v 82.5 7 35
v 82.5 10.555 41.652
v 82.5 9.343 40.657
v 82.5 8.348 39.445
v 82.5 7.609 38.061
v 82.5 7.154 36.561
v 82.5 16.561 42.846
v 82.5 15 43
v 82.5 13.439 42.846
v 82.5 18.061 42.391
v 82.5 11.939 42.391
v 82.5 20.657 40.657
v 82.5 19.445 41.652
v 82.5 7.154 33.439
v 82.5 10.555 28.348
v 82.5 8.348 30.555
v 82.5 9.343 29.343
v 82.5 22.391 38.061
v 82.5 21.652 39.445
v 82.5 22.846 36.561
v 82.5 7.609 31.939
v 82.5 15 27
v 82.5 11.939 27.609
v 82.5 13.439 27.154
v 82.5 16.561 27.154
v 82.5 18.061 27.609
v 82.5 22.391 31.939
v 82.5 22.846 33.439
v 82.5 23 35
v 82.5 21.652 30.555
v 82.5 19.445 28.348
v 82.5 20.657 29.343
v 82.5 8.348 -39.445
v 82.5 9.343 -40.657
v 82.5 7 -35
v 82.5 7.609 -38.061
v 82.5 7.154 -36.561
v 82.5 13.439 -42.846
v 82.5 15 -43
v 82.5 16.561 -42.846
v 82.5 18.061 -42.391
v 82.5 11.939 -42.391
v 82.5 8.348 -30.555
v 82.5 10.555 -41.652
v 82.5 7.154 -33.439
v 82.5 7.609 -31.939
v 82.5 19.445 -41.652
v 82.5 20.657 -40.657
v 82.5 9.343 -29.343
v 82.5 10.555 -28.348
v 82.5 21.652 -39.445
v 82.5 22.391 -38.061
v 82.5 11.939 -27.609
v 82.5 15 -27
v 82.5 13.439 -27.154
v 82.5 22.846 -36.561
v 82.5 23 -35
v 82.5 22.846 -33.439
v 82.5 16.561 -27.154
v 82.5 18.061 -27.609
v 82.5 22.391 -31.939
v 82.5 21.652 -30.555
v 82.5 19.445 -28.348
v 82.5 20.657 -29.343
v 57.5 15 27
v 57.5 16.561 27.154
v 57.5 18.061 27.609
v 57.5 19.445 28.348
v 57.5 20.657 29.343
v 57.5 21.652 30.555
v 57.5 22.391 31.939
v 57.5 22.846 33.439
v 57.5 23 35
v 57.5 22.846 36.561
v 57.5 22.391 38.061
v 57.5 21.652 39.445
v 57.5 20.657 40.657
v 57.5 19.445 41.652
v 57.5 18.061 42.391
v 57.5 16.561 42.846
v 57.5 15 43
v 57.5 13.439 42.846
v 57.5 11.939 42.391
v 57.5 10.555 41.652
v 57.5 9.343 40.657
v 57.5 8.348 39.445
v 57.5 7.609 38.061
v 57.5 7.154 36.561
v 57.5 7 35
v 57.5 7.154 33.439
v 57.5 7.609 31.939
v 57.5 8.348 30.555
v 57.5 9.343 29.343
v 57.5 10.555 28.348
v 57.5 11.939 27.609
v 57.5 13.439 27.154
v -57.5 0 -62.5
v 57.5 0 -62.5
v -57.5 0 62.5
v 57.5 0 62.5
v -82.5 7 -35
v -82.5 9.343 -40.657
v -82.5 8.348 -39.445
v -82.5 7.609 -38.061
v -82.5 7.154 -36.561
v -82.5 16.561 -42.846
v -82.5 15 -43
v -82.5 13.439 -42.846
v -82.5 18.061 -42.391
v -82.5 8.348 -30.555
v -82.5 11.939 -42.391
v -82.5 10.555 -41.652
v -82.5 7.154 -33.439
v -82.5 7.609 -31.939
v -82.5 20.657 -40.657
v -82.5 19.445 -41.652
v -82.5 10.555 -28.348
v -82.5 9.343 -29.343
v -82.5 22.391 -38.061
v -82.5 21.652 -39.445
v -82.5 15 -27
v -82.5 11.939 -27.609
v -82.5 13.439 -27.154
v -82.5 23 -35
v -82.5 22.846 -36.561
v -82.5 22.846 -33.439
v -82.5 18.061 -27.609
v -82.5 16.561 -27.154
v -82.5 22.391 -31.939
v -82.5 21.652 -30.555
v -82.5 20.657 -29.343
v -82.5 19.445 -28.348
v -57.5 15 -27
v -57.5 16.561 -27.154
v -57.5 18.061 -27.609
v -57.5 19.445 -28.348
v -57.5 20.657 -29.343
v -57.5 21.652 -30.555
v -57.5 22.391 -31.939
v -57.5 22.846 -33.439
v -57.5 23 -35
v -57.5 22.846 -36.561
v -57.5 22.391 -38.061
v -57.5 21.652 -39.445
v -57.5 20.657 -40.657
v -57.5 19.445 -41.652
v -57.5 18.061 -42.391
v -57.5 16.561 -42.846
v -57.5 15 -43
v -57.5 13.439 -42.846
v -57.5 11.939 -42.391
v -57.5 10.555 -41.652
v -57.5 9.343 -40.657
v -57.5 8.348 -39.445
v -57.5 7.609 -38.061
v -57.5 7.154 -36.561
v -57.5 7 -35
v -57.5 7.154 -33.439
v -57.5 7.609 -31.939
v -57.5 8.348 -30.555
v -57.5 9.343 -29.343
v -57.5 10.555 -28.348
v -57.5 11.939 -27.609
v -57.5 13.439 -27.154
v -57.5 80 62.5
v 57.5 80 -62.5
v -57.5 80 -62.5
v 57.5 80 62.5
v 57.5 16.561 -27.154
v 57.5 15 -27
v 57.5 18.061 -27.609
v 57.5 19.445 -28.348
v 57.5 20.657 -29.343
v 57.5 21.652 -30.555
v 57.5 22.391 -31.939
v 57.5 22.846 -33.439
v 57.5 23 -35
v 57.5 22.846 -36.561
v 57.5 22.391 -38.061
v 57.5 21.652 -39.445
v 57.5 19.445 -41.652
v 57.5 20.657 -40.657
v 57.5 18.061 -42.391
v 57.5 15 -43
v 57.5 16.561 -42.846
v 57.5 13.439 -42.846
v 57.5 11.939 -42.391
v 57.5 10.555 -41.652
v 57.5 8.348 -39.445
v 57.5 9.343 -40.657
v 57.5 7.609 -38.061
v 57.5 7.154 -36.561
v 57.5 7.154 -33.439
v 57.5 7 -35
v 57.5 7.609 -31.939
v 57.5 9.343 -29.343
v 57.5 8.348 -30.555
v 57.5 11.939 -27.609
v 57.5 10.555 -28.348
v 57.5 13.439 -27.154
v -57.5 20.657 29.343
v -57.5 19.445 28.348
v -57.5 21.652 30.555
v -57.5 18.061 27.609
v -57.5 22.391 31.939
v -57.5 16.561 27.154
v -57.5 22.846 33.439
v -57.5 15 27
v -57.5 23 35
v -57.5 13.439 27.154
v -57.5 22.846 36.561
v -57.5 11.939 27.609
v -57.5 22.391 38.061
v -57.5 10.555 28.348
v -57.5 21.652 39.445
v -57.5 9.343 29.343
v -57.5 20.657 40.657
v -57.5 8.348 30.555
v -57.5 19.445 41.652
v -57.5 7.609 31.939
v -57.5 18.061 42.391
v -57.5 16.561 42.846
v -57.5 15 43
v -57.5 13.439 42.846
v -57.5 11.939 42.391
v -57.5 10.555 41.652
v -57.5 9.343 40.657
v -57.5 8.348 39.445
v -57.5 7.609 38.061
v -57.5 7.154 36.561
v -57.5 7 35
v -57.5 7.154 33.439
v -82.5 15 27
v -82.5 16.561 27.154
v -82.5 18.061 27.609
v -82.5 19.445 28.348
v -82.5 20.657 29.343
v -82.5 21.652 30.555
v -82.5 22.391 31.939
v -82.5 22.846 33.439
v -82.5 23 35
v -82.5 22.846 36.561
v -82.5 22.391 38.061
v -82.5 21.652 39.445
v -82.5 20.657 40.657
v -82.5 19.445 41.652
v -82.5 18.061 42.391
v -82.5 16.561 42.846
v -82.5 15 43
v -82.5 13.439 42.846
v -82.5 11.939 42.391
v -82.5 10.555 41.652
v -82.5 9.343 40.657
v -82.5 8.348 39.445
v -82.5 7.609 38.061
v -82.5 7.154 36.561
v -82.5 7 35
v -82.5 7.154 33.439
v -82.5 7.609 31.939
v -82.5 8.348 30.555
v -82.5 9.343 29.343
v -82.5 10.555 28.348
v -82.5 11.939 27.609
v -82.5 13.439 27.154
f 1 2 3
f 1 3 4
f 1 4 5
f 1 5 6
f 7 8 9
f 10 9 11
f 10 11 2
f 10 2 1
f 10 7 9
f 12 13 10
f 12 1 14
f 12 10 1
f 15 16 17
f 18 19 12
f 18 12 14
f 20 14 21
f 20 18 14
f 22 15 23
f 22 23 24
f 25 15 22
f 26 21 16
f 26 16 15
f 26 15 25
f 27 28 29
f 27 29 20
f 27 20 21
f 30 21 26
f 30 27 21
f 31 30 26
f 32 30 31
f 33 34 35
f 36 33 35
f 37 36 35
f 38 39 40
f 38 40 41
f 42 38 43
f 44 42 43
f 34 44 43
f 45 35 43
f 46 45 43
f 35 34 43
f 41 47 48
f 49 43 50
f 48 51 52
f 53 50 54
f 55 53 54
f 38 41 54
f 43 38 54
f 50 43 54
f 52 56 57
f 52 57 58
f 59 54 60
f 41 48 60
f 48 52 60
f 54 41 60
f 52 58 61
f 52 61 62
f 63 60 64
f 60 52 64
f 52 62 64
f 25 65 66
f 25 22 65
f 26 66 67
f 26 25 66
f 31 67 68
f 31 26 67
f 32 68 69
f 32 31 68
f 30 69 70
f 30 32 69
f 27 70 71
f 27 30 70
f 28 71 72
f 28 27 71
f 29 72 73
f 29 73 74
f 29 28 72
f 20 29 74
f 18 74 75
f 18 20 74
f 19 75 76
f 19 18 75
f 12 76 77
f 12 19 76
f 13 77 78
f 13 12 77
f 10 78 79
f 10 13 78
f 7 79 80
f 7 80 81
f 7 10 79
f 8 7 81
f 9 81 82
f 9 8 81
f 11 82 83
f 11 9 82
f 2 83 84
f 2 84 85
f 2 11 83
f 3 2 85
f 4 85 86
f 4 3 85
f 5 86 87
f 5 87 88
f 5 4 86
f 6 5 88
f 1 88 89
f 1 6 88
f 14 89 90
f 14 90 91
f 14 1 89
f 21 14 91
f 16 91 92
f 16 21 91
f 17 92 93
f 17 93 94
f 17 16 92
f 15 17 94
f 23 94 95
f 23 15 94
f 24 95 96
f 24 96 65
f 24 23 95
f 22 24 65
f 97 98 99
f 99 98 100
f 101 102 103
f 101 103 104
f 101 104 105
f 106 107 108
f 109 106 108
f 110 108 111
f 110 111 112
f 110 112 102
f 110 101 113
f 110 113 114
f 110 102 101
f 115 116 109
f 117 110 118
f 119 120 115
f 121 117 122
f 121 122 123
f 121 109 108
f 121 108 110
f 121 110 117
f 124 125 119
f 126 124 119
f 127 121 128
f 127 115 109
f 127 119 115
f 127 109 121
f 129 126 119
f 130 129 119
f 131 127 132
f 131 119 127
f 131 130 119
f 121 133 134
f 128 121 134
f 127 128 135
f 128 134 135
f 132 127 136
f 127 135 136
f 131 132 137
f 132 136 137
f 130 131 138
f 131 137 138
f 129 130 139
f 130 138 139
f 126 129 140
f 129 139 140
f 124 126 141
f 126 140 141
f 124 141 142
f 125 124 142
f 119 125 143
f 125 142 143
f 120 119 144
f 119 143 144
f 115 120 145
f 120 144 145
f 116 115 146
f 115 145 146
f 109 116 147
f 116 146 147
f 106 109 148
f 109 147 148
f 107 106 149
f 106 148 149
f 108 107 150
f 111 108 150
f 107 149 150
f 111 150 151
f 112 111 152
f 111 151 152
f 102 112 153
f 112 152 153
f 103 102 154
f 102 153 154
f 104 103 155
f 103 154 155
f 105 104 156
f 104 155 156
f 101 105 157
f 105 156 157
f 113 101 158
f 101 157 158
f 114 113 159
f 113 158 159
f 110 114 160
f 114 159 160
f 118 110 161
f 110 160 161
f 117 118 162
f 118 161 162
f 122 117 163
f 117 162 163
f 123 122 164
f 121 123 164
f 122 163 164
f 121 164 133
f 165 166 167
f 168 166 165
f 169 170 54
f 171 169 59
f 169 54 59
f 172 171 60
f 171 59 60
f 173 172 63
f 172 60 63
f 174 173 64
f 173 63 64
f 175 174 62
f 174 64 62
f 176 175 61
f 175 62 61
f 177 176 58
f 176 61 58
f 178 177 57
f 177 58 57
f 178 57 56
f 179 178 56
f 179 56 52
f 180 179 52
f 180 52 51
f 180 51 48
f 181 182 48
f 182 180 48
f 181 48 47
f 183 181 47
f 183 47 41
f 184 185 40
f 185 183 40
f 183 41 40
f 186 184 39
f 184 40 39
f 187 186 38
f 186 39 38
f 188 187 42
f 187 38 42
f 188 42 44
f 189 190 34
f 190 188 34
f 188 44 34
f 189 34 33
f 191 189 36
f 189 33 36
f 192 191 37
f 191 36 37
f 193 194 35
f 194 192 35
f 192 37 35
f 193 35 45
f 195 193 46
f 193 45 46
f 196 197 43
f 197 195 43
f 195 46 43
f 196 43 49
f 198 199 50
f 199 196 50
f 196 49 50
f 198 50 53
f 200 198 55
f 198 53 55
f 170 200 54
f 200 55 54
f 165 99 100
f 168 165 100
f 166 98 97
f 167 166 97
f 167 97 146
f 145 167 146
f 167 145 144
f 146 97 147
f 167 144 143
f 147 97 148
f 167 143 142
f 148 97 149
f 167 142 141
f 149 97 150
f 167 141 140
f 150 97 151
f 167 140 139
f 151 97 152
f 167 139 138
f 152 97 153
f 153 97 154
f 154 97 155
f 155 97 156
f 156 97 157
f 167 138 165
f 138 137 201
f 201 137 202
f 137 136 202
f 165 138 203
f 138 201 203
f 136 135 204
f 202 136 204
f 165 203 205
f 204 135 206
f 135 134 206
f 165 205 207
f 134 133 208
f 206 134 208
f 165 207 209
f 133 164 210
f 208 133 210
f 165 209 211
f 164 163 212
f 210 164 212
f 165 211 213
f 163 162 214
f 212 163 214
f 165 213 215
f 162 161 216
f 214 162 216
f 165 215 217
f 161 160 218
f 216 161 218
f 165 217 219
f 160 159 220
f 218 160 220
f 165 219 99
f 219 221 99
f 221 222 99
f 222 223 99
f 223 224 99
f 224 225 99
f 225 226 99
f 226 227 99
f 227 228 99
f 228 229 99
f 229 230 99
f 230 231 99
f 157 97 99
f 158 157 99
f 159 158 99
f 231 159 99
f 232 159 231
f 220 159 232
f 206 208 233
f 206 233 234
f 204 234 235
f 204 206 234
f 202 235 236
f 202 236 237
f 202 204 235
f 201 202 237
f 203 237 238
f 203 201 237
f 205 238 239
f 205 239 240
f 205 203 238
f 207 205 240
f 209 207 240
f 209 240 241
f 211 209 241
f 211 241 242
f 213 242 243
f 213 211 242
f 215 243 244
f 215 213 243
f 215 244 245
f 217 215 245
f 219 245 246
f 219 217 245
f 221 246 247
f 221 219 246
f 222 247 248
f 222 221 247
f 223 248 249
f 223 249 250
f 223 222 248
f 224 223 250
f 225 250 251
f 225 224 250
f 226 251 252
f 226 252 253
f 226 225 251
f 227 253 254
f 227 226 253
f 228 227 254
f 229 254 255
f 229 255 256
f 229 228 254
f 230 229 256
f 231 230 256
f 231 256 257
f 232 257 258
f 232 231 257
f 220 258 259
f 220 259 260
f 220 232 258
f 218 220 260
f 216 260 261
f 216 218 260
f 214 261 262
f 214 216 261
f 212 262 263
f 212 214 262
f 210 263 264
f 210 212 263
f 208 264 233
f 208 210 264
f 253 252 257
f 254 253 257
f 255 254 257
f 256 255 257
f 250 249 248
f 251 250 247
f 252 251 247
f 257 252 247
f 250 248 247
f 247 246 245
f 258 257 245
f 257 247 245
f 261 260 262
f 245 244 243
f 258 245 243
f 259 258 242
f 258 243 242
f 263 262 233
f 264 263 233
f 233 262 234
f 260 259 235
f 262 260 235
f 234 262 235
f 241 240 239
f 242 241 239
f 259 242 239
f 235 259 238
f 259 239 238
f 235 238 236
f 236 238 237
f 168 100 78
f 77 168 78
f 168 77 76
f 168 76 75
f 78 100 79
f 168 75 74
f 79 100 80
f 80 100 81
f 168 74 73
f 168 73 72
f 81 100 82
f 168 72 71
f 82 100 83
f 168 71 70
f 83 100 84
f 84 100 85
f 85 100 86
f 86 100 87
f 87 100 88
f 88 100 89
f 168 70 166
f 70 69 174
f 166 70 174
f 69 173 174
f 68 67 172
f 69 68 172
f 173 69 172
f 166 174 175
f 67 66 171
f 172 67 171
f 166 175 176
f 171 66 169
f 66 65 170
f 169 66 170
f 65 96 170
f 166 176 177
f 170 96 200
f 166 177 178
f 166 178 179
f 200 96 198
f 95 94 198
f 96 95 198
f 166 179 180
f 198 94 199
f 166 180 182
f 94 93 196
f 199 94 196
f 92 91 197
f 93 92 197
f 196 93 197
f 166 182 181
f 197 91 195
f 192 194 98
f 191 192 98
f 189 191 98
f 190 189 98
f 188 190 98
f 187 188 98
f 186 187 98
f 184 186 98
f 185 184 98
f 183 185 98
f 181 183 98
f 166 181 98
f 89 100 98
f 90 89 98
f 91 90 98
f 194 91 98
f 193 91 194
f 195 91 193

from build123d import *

# Parameters (mm, degrees)
EXTRUDE_2_DEPTH = 80
SKETCH_1_R      = 8
EXTRUDE_3_DEPTH = 82.5


with BuildPart() as part:
    # Sketch 3D_1 → 보스-돌출2 (new body)
    with BuildSketch(Plane(origin=(-57.5, 0, 62.5), x_dir=(0.6770565308208834, 0, -0.7359310117618296), z_dir=(0, -1, 0))):
        Polygon((0, 0), (77.861501044, 84.632066353), (169.852877515, 0), (91.99137647, -84.632066353), align=None)
    extrude(amount=-EXTRUDE_2_DEPTH)

    # 스케치1 → 보스-돌출3 (add, symmetric)
    with BuildSketch(Plane(origin=(0, 0, 0), x_dir=(0, 0, -1), z_dir=(1, 0, 0))):
        with Locations((-35, 15)):
            Circle(SKETCH_1_R)
    extrude_3 = extrude(amount=EXTRUDE_3_DEPTH, both=True)

    # 대칭 복사1: 보스-돌출3 across plane
    add(extrude_3.mirror(Plane.XY))


solid = part.part
